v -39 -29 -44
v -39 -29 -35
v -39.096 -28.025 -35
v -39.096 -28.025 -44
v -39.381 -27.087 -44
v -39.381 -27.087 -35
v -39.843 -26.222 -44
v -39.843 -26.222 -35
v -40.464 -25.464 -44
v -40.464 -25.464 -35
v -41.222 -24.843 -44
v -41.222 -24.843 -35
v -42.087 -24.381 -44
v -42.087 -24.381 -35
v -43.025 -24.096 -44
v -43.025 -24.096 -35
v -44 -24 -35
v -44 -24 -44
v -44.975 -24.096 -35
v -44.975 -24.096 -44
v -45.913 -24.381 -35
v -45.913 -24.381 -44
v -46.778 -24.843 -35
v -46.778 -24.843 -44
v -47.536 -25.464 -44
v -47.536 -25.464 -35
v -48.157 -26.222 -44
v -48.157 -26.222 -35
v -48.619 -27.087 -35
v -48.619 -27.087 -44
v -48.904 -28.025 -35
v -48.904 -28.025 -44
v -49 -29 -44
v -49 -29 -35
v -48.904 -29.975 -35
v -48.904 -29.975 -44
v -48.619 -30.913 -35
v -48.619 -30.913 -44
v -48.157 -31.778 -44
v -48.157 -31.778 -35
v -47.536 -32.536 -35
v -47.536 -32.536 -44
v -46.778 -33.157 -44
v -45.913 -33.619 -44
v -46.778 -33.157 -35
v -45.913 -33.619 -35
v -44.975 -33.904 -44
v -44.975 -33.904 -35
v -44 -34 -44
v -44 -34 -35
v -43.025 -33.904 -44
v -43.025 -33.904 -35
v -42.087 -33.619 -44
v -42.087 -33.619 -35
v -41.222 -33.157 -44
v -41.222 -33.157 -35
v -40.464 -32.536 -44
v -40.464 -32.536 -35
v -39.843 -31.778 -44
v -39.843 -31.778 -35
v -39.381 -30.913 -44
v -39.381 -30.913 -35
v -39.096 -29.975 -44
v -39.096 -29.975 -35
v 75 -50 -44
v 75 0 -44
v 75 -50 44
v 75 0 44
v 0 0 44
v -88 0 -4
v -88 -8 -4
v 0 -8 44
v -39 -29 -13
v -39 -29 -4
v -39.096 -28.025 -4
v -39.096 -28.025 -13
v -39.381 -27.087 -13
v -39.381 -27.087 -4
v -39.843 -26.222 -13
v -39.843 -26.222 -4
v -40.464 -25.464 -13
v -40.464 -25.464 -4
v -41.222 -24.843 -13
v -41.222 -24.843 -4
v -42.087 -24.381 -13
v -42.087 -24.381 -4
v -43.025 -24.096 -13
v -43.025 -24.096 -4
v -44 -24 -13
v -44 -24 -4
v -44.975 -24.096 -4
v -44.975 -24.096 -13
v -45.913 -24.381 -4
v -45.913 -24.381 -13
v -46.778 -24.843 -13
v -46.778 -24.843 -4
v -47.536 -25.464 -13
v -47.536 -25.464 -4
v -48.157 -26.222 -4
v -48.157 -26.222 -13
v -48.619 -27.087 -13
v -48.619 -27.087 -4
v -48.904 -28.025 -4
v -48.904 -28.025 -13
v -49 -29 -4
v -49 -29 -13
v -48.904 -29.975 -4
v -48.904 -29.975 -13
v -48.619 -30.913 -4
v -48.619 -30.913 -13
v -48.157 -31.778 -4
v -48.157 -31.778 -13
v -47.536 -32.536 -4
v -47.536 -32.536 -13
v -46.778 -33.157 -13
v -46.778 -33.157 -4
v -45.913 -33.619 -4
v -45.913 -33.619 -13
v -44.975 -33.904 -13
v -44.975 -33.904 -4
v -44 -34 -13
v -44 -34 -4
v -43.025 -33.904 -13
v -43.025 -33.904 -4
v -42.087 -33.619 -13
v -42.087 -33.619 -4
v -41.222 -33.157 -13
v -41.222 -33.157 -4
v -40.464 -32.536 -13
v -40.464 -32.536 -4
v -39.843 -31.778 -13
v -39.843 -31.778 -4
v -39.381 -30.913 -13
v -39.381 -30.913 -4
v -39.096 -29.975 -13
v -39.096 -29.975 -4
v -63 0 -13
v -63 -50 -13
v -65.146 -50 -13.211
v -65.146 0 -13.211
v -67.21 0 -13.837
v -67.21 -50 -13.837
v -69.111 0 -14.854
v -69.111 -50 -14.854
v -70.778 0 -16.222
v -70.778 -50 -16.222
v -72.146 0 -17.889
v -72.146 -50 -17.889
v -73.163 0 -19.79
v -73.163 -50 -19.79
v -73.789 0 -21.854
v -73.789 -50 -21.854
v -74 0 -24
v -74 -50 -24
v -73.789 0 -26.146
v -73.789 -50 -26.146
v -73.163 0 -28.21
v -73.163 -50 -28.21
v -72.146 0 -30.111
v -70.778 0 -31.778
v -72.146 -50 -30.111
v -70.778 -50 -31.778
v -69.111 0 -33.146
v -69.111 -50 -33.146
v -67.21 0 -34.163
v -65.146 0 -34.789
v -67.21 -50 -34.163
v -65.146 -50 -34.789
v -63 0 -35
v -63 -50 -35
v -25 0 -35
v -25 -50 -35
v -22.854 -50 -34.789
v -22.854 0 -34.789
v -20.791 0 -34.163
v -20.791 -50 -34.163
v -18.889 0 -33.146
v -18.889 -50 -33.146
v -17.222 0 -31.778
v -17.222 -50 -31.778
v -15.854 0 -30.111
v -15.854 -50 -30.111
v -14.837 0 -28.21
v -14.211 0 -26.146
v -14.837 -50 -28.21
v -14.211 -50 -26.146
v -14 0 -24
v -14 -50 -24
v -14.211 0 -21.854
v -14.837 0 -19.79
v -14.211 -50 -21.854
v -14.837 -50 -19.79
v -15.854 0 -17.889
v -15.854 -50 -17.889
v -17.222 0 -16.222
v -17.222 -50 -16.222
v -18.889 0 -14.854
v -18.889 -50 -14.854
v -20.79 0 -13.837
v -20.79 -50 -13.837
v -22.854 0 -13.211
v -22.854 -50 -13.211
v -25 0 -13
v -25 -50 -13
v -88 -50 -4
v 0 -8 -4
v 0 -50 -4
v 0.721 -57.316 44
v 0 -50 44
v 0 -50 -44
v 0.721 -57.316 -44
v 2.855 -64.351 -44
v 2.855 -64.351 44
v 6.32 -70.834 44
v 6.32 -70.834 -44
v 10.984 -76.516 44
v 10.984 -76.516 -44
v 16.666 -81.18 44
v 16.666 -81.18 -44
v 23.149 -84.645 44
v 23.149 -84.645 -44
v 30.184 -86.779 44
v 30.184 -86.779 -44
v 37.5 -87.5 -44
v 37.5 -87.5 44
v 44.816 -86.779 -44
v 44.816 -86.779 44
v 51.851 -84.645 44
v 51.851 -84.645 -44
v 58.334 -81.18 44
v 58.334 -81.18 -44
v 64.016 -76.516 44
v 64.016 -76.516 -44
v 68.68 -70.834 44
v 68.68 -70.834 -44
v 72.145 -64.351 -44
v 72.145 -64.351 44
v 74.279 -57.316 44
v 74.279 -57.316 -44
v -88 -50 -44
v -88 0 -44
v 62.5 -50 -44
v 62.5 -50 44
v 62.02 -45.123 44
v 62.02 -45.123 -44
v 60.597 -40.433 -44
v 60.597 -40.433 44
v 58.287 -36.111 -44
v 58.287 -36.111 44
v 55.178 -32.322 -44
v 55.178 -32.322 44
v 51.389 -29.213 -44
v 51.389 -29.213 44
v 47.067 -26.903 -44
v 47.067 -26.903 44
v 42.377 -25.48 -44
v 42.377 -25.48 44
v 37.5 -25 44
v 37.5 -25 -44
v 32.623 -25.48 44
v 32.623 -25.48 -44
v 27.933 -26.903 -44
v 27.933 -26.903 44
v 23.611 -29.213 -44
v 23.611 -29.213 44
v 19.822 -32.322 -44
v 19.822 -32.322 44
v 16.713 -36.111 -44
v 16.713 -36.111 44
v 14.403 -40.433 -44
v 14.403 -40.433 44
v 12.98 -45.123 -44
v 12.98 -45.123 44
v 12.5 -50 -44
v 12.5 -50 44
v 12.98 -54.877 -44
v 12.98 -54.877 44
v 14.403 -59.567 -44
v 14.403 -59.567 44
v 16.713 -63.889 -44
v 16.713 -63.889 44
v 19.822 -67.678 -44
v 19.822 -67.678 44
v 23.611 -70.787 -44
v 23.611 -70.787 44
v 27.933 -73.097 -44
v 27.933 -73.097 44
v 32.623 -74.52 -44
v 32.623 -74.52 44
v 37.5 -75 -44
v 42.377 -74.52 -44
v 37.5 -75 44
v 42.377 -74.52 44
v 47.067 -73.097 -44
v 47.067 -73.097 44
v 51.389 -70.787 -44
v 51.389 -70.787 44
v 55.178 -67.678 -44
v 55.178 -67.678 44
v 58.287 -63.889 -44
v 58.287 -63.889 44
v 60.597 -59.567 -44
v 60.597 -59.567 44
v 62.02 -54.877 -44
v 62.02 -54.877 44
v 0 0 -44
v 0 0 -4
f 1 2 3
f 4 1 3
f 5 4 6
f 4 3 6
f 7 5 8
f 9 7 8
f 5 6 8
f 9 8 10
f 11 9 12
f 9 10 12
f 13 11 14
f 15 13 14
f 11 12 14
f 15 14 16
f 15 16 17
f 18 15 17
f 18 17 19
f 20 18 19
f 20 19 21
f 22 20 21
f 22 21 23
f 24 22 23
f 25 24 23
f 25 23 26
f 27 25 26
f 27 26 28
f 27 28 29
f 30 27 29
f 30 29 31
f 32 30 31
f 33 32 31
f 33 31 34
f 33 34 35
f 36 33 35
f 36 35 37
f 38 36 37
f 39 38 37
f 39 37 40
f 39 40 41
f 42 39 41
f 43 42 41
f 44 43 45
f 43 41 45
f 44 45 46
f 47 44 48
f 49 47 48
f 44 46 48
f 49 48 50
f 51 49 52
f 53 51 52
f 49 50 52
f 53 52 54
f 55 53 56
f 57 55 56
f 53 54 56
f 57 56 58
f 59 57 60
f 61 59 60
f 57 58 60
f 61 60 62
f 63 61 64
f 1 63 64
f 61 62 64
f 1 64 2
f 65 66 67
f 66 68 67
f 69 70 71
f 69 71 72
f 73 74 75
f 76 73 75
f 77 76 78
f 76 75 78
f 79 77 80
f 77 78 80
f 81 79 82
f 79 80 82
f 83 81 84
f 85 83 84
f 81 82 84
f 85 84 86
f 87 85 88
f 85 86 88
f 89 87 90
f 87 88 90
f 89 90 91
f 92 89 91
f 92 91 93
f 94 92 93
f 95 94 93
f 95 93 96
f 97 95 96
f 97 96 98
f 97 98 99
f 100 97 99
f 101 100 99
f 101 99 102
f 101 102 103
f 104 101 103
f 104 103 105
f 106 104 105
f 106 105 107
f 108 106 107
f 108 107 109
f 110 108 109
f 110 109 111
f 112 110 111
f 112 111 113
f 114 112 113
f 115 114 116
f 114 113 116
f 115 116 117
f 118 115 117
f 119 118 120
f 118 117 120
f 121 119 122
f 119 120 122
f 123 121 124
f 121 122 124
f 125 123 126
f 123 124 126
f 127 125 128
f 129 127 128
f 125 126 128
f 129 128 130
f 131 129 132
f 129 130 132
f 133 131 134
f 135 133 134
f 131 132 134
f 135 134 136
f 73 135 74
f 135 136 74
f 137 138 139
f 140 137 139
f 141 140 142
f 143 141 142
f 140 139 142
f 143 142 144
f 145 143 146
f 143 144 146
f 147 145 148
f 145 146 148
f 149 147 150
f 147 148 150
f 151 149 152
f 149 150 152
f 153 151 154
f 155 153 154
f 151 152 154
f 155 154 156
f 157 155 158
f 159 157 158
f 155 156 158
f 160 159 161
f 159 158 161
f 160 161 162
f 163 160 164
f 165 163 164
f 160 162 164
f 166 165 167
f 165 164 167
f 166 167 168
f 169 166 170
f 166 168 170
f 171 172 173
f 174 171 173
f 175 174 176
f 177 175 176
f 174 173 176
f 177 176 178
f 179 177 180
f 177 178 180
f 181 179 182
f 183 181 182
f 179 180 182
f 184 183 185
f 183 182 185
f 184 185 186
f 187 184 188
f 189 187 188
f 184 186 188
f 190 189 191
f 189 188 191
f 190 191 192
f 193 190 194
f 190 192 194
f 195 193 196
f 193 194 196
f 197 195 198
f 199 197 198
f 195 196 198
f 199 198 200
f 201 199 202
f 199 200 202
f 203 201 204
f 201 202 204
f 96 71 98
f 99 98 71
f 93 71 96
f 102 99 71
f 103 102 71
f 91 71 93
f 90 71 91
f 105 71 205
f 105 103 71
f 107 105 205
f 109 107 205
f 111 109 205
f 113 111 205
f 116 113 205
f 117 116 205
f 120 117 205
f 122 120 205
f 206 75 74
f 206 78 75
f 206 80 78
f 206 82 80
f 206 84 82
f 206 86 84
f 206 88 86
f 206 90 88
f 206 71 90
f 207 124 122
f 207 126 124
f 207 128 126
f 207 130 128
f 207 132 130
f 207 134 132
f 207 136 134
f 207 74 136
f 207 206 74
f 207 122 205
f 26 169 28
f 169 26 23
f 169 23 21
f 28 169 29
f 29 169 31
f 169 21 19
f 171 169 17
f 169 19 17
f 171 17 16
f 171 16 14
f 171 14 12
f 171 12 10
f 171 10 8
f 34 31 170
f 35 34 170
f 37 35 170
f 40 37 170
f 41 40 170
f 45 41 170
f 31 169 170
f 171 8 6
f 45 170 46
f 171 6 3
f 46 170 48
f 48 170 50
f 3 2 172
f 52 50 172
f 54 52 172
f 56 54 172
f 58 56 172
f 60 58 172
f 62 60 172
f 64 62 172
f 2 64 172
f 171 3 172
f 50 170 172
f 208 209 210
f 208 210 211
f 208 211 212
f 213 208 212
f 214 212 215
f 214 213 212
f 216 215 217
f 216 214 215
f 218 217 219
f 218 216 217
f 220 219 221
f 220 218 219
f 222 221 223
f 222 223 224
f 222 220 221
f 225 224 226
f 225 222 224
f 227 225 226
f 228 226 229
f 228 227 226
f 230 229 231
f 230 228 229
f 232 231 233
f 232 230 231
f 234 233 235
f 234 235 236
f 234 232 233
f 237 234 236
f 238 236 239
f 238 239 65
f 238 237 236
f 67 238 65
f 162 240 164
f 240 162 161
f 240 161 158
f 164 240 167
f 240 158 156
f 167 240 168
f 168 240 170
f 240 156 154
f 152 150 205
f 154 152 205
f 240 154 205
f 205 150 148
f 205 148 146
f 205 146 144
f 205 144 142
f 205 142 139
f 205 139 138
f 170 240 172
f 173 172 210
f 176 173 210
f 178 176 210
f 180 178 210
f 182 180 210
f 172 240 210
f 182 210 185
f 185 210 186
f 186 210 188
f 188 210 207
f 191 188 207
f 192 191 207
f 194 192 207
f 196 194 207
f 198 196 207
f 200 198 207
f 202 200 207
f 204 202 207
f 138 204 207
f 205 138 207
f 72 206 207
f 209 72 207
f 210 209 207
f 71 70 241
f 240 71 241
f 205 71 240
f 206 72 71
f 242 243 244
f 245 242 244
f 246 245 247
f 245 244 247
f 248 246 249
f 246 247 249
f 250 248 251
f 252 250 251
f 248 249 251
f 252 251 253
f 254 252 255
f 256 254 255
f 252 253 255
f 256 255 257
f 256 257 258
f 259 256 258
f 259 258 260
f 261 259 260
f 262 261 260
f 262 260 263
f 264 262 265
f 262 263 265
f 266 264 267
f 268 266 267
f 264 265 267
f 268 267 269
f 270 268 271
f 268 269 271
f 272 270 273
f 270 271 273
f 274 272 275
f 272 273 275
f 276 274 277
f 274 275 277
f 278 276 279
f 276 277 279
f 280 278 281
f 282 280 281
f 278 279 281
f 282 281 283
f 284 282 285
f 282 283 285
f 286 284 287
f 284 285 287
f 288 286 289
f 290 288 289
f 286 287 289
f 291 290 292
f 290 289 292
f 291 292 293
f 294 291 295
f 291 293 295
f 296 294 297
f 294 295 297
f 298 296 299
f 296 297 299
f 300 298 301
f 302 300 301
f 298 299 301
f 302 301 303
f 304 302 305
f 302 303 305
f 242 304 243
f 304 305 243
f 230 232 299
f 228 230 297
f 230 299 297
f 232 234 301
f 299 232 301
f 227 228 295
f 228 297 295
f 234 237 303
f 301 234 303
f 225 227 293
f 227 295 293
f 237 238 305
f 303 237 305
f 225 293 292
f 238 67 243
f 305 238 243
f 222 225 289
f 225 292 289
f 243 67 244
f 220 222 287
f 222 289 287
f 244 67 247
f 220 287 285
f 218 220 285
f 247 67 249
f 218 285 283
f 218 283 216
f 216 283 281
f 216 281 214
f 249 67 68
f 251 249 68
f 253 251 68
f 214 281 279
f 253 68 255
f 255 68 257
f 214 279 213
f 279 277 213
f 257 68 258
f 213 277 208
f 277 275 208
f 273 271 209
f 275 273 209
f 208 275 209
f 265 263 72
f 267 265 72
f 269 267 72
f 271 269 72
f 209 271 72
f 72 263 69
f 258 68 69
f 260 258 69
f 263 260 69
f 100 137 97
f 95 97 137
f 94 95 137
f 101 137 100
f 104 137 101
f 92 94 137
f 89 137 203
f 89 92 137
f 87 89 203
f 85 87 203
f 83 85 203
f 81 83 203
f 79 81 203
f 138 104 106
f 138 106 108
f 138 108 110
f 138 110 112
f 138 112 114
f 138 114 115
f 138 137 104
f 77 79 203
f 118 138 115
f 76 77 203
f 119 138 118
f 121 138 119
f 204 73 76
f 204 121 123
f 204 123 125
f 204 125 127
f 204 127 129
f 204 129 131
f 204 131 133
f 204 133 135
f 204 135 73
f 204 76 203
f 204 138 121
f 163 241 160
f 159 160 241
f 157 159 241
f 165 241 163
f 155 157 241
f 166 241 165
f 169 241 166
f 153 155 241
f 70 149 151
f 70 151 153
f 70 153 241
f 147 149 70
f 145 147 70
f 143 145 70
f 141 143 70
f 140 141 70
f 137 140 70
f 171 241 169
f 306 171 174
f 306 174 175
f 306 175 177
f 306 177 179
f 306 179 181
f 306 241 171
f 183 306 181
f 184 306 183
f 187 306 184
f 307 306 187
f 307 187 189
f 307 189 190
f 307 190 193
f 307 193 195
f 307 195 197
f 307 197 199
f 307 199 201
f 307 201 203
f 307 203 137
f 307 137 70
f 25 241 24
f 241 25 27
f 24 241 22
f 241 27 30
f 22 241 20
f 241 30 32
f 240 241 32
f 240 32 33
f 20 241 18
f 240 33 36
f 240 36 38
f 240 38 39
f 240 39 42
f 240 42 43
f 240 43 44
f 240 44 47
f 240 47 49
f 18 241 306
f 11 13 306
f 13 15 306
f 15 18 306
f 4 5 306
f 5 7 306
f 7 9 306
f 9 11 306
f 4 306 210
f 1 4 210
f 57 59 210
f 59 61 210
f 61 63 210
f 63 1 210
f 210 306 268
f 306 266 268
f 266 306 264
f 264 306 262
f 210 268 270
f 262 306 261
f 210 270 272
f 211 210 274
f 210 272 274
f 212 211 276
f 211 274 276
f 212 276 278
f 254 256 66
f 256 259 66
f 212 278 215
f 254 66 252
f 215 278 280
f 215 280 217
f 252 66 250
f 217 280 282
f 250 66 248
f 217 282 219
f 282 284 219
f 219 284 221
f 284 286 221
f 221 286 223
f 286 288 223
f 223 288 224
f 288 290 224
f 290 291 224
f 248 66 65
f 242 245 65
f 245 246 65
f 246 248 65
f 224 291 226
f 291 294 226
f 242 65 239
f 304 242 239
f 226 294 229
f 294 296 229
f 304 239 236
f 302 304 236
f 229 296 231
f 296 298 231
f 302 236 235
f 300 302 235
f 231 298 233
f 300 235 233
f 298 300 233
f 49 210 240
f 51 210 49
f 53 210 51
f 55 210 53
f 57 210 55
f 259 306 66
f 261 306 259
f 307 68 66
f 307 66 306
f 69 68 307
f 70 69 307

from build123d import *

# Parameters (mm, degrees)
PAD_DEPTH     = 44
SKETCH004_W   = 50
SKETCH004_H   = 40
PAD001_DEPTH  = 88
SKETCH005_R   = 25
HOLE_DEPTH    = 88
POCKET_DEPTH  = 50
SKETCH007_R   = 5
HOLE001_DEPTH = 40
PAD002_DEPTH  = 8


with BuildPart() as part:
    # Sketch → Pad (new body, symmetric)
    with BuildSketch(Plane.XY):
        with BuildLine():
            Line((0, 0), (75, 0))
            Line((75, 0), (75, -50))
            ThreePointArc((0, -50), (37.5, -87.499933), (75, -50))
            Line((0, 0), (0, -50))
        make_face()
    extrude(amount=PAD_DEPTH, both=True)

    # Sketch004 (on Face4 of Pad) → Pad001 (join)
    with BuildSketch(Plane(origin=(0, 0, 0), x_dir=(0, -1, 0), z_dir=(-1, 0, 0))):
        with Locations((24.999986, -24)):
            Rectangle(SKETCH004_W, SKETCH004_H)
    extrude(amount=PAD001_DEPTH)

    # Sketch005 (on Face6 of Pad001) → Hole (cut)
    with BuildSketch(Plane.XY.offset(44)):
        with Locations((37.5, -50)):
            Circle(SKETCH005_R)
    extrude(amount=-HOLE_DEPTH, mode=Mode.SUBTRACT)

    # Sketch006 (on Face10 of Hole) → Pocket (cut)
    with BuildSketch(Plane.XZ.offset(49.999986)):
        with BuildLine():
            ThreePointArc((-25.000028, -35), (-14, -24.000014), (-25, -13))
            Line((-63, -13), (-25, -13))
            ThreePointArc((-63, -13), (-74, -24), (-63, -35))
            Line((-63, -35), (-25.000028, -35))
        make_face()
    extrude(amount=-POCKET_DEPTH, mode=Mode.SUBTRACT)

    # Sketch007 (on Face9 of Pocket) → Hole001 (cut)
    with BuildSketch(Plane.XY.offset(-4)):
        with Locations((-44, -29)):
            Circle(SKETCH007_R)
    extrude(amount=-HOLE001_DEPTH, mode=Mode.SUBTRACT)

    # Sketch008 (on Face1 of Hole001) → Pad002 (join)
    with BuildSketch(Plane(origin=(0, 0, 0), x_dir=(-1, 0, 0), z_dir=(0, 1, 0))):
        Polygon((0, -4), (88, -4), (0, 44), align=None)
    extrude(amount=-PAD002_DEPTH)


solid = part.part
